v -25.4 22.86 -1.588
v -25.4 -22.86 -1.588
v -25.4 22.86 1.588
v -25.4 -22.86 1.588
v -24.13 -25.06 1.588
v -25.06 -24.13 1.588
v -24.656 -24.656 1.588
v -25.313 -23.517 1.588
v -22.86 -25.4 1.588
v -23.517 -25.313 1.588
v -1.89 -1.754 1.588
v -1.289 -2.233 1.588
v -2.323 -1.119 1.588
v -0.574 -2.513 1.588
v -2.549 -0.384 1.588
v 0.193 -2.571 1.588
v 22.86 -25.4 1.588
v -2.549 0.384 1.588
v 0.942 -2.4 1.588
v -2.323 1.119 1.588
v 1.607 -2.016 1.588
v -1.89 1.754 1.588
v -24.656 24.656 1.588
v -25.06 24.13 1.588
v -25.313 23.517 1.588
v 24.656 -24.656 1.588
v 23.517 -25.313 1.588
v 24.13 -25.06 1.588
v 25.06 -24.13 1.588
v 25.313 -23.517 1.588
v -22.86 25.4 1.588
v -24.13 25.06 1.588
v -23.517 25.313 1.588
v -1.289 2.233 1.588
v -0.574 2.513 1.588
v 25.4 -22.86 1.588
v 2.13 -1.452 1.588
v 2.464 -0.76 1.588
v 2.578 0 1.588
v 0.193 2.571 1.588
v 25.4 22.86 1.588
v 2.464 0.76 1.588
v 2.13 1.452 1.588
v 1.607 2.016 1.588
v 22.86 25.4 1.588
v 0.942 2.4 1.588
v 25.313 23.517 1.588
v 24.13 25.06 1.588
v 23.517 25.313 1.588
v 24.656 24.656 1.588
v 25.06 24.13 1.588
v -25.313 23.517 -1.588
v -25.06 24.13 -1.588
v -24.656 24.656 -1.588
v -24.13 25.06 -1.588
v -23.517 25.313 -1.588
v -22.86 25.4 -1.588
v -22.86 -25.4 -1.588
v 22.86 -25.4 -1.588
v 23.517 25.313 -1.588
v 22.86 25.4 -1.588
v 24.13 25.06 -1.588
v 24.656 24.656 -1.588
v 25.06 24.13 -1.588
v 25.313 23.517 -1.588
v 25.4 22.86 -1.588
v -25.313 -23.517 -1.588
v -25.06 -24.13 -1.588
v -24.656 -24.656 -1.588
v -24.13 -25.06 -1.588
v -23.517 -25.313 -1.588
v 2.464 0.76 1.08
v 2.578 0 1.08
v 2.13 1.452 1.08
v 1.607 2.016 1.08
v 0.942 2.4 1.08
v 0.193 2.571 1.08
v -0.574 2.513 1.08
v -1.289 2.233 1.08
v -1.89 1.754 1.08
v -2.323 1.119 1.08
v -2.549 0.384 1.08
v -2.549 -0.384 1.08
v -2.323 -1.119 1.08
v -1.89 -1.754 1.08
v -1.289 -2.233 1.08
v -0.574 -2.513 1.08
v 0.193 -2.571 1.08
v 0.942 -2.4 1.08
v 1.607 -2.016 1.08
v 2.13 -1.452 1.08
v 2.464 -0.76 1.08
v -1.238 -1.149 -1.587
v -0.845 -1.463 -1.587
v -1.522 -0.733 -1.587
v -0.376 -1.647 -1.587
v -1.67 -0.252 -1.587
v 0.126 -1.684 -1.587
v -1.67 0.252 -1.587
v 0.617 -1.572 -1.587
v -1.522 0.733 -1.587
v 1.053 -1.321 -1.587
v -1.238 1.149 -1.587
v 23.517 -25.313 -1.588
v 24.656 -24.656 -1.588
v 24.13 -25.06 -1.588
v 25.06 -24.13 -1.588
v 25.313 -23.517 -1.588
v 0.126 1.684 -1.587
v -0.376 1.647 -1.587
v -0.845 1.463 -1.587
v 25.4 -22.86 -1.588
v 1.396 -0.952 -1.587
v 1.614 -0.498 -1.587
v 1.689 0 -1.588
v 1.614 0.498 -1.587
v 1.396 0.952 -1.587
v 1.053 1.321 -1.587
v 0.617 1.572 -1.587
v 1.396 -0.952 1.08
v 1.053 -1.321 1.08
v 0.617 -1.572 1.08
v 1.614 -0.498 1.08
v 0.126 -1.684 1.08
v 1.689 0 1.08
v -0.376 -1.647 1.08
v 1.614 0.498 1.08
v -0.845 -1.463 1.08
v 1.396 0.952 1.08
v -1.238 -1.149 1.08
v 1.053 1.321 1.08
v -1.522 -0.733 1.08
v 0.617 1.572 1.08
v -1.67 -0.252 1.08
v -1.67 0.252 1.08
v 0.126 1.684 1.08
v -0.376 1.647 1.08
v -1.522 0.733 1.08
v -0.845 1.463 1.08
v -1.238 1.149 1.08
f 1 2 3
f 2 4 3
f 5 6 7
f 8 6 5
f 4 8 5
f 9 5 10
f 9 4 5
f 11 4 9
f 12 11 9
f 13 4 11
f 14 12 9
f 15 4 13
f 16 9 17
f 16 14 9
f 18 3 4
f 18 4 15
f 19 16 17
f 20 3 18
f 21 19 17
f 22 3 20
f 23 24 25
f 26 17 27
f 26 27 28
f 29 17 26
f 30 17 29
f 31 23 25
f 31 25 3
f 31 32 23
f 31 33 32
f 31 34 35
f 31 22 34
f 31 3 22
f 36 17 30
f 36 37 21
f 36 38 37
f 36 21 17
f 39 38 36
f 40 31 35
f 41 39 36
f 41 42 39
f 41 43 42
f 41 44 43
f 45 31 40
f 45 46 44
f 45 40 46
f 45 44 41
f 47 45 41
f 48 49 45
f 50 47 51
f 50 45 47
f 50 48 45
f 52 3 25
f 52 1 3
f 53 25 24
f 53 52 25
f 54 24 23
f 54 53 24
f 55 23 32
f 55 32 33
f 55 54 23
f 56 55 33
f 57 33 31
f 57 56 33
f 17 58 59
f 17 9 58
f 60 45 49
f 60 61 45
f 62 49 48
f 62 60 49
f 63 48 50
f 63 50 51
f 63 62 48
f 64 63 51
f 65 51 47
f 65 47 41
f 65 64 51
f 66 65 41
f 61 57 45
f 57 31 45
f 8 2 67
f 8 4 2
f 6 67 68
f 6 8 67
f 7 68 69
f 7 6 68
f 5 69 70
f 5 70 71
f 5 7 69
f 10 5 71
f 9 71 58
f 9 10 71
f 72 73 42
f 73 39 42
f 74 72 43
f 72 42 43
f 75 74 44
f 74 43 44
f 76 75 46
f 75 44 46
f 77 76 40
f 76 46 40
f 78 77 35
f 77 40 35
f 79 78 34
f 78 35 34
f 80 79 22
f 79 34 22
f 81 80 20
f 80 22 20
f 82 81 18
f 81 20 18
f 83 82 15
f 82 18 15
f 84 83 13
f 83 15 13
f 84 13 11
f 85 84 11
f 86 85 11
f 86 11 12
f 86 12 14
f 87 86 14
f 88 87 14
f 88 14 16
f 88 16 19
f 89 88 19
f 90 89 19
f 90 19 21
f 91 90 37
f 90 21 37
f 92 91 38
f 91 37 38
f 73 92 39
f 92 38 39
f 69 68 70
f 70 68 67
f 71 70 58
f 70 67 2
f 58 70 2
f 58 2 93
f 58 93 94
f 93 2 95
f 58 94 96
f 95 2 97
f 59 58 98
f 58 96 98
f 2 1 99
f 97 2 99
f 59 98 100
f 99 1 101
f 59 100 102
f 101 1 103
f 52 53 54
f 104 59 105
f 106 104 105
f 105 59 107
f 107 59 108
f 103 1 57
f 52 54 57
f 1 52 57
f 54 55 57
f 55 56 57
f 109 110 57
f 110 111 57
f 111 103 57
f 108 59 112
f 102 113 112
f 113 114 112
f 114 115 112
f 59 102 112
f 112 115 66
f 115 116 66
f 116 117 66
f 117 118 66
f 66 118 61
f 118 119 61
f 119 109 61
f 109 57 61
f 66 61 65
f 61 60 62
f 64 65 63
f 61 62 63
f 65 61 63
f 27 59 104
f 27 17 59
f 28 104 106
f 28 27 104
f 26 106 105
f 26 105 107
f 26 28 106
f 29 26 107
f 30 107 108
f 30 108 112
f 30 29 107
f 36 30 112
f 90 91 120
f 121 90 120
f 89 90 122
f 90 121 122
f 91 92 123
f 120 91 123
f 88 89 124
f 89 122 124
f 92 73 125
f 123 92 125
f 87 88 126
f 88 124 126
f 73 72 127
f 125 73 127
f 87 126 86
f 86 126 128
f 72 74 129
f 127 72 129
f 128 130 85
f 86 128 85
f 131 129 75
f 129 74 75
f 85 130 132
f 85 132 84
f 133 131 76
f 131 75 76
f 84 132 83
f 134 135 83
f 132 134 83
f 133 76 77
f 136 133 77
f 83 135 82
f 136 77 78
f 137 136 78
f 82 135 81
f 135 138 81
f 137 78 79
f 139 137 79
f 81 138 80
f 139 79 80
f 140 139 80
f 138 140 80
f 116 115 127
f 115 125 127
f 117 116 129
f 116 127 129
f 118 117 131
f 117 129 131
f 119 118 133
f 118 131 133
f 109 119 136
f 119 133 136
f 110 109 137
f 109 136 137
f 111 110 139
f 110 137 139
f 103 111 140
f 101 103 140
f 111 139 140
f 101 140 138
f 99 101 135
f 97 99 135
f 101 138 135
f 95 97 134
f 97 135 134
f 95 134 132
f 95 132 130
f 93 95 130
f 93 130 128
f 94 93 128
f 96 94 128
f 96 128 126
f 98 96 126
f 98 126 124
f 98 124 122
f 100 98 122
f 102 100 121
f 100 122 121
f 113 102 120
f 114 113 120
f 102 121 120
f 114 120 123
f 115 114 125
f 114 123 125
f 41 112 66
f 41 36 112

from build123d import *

# Parameters (mm, degrees)
F0_W     = 50.8
F0_H     = 50.8
F1_DEPTH = 1.5875
F4_R     = 2.54


with BuildPart() as f1:
    # F0 (on Top) → F1 (new body, symmetric)
    with BuildSketch(Plane.XY):
        Rectangle(F0_W, F0_H)
    extrude(amount=F1_DEPTH, both=True)

    # F2 (on Front) → F3 (revolve, cut)
    with BuildSketch(Plane.XZ):
        Polygon((2.5781, 1.5875), (0, 1.5875), (0, -1.5875), (1.6891, -1.5875), (1.6891, 1.0795), (2.5781, 1.0795), align=None)
    revolve(axis=Axis((0, 0, 3.175), (0, 0, 1)), mode=Mode.SUBTRACT)

    # F4
    f4_edges = [f1.edges().sort_by_distance(p)[0] for p in [
        (-25.4, -25.4, 0),
        (25.4, -25.4, 0),
        (25.4, 25.4, 0),
        (-25.4, 25.4, 0),
    ]]
    fillet(f4_edges, radius=F4_R)


solid = f1.part
